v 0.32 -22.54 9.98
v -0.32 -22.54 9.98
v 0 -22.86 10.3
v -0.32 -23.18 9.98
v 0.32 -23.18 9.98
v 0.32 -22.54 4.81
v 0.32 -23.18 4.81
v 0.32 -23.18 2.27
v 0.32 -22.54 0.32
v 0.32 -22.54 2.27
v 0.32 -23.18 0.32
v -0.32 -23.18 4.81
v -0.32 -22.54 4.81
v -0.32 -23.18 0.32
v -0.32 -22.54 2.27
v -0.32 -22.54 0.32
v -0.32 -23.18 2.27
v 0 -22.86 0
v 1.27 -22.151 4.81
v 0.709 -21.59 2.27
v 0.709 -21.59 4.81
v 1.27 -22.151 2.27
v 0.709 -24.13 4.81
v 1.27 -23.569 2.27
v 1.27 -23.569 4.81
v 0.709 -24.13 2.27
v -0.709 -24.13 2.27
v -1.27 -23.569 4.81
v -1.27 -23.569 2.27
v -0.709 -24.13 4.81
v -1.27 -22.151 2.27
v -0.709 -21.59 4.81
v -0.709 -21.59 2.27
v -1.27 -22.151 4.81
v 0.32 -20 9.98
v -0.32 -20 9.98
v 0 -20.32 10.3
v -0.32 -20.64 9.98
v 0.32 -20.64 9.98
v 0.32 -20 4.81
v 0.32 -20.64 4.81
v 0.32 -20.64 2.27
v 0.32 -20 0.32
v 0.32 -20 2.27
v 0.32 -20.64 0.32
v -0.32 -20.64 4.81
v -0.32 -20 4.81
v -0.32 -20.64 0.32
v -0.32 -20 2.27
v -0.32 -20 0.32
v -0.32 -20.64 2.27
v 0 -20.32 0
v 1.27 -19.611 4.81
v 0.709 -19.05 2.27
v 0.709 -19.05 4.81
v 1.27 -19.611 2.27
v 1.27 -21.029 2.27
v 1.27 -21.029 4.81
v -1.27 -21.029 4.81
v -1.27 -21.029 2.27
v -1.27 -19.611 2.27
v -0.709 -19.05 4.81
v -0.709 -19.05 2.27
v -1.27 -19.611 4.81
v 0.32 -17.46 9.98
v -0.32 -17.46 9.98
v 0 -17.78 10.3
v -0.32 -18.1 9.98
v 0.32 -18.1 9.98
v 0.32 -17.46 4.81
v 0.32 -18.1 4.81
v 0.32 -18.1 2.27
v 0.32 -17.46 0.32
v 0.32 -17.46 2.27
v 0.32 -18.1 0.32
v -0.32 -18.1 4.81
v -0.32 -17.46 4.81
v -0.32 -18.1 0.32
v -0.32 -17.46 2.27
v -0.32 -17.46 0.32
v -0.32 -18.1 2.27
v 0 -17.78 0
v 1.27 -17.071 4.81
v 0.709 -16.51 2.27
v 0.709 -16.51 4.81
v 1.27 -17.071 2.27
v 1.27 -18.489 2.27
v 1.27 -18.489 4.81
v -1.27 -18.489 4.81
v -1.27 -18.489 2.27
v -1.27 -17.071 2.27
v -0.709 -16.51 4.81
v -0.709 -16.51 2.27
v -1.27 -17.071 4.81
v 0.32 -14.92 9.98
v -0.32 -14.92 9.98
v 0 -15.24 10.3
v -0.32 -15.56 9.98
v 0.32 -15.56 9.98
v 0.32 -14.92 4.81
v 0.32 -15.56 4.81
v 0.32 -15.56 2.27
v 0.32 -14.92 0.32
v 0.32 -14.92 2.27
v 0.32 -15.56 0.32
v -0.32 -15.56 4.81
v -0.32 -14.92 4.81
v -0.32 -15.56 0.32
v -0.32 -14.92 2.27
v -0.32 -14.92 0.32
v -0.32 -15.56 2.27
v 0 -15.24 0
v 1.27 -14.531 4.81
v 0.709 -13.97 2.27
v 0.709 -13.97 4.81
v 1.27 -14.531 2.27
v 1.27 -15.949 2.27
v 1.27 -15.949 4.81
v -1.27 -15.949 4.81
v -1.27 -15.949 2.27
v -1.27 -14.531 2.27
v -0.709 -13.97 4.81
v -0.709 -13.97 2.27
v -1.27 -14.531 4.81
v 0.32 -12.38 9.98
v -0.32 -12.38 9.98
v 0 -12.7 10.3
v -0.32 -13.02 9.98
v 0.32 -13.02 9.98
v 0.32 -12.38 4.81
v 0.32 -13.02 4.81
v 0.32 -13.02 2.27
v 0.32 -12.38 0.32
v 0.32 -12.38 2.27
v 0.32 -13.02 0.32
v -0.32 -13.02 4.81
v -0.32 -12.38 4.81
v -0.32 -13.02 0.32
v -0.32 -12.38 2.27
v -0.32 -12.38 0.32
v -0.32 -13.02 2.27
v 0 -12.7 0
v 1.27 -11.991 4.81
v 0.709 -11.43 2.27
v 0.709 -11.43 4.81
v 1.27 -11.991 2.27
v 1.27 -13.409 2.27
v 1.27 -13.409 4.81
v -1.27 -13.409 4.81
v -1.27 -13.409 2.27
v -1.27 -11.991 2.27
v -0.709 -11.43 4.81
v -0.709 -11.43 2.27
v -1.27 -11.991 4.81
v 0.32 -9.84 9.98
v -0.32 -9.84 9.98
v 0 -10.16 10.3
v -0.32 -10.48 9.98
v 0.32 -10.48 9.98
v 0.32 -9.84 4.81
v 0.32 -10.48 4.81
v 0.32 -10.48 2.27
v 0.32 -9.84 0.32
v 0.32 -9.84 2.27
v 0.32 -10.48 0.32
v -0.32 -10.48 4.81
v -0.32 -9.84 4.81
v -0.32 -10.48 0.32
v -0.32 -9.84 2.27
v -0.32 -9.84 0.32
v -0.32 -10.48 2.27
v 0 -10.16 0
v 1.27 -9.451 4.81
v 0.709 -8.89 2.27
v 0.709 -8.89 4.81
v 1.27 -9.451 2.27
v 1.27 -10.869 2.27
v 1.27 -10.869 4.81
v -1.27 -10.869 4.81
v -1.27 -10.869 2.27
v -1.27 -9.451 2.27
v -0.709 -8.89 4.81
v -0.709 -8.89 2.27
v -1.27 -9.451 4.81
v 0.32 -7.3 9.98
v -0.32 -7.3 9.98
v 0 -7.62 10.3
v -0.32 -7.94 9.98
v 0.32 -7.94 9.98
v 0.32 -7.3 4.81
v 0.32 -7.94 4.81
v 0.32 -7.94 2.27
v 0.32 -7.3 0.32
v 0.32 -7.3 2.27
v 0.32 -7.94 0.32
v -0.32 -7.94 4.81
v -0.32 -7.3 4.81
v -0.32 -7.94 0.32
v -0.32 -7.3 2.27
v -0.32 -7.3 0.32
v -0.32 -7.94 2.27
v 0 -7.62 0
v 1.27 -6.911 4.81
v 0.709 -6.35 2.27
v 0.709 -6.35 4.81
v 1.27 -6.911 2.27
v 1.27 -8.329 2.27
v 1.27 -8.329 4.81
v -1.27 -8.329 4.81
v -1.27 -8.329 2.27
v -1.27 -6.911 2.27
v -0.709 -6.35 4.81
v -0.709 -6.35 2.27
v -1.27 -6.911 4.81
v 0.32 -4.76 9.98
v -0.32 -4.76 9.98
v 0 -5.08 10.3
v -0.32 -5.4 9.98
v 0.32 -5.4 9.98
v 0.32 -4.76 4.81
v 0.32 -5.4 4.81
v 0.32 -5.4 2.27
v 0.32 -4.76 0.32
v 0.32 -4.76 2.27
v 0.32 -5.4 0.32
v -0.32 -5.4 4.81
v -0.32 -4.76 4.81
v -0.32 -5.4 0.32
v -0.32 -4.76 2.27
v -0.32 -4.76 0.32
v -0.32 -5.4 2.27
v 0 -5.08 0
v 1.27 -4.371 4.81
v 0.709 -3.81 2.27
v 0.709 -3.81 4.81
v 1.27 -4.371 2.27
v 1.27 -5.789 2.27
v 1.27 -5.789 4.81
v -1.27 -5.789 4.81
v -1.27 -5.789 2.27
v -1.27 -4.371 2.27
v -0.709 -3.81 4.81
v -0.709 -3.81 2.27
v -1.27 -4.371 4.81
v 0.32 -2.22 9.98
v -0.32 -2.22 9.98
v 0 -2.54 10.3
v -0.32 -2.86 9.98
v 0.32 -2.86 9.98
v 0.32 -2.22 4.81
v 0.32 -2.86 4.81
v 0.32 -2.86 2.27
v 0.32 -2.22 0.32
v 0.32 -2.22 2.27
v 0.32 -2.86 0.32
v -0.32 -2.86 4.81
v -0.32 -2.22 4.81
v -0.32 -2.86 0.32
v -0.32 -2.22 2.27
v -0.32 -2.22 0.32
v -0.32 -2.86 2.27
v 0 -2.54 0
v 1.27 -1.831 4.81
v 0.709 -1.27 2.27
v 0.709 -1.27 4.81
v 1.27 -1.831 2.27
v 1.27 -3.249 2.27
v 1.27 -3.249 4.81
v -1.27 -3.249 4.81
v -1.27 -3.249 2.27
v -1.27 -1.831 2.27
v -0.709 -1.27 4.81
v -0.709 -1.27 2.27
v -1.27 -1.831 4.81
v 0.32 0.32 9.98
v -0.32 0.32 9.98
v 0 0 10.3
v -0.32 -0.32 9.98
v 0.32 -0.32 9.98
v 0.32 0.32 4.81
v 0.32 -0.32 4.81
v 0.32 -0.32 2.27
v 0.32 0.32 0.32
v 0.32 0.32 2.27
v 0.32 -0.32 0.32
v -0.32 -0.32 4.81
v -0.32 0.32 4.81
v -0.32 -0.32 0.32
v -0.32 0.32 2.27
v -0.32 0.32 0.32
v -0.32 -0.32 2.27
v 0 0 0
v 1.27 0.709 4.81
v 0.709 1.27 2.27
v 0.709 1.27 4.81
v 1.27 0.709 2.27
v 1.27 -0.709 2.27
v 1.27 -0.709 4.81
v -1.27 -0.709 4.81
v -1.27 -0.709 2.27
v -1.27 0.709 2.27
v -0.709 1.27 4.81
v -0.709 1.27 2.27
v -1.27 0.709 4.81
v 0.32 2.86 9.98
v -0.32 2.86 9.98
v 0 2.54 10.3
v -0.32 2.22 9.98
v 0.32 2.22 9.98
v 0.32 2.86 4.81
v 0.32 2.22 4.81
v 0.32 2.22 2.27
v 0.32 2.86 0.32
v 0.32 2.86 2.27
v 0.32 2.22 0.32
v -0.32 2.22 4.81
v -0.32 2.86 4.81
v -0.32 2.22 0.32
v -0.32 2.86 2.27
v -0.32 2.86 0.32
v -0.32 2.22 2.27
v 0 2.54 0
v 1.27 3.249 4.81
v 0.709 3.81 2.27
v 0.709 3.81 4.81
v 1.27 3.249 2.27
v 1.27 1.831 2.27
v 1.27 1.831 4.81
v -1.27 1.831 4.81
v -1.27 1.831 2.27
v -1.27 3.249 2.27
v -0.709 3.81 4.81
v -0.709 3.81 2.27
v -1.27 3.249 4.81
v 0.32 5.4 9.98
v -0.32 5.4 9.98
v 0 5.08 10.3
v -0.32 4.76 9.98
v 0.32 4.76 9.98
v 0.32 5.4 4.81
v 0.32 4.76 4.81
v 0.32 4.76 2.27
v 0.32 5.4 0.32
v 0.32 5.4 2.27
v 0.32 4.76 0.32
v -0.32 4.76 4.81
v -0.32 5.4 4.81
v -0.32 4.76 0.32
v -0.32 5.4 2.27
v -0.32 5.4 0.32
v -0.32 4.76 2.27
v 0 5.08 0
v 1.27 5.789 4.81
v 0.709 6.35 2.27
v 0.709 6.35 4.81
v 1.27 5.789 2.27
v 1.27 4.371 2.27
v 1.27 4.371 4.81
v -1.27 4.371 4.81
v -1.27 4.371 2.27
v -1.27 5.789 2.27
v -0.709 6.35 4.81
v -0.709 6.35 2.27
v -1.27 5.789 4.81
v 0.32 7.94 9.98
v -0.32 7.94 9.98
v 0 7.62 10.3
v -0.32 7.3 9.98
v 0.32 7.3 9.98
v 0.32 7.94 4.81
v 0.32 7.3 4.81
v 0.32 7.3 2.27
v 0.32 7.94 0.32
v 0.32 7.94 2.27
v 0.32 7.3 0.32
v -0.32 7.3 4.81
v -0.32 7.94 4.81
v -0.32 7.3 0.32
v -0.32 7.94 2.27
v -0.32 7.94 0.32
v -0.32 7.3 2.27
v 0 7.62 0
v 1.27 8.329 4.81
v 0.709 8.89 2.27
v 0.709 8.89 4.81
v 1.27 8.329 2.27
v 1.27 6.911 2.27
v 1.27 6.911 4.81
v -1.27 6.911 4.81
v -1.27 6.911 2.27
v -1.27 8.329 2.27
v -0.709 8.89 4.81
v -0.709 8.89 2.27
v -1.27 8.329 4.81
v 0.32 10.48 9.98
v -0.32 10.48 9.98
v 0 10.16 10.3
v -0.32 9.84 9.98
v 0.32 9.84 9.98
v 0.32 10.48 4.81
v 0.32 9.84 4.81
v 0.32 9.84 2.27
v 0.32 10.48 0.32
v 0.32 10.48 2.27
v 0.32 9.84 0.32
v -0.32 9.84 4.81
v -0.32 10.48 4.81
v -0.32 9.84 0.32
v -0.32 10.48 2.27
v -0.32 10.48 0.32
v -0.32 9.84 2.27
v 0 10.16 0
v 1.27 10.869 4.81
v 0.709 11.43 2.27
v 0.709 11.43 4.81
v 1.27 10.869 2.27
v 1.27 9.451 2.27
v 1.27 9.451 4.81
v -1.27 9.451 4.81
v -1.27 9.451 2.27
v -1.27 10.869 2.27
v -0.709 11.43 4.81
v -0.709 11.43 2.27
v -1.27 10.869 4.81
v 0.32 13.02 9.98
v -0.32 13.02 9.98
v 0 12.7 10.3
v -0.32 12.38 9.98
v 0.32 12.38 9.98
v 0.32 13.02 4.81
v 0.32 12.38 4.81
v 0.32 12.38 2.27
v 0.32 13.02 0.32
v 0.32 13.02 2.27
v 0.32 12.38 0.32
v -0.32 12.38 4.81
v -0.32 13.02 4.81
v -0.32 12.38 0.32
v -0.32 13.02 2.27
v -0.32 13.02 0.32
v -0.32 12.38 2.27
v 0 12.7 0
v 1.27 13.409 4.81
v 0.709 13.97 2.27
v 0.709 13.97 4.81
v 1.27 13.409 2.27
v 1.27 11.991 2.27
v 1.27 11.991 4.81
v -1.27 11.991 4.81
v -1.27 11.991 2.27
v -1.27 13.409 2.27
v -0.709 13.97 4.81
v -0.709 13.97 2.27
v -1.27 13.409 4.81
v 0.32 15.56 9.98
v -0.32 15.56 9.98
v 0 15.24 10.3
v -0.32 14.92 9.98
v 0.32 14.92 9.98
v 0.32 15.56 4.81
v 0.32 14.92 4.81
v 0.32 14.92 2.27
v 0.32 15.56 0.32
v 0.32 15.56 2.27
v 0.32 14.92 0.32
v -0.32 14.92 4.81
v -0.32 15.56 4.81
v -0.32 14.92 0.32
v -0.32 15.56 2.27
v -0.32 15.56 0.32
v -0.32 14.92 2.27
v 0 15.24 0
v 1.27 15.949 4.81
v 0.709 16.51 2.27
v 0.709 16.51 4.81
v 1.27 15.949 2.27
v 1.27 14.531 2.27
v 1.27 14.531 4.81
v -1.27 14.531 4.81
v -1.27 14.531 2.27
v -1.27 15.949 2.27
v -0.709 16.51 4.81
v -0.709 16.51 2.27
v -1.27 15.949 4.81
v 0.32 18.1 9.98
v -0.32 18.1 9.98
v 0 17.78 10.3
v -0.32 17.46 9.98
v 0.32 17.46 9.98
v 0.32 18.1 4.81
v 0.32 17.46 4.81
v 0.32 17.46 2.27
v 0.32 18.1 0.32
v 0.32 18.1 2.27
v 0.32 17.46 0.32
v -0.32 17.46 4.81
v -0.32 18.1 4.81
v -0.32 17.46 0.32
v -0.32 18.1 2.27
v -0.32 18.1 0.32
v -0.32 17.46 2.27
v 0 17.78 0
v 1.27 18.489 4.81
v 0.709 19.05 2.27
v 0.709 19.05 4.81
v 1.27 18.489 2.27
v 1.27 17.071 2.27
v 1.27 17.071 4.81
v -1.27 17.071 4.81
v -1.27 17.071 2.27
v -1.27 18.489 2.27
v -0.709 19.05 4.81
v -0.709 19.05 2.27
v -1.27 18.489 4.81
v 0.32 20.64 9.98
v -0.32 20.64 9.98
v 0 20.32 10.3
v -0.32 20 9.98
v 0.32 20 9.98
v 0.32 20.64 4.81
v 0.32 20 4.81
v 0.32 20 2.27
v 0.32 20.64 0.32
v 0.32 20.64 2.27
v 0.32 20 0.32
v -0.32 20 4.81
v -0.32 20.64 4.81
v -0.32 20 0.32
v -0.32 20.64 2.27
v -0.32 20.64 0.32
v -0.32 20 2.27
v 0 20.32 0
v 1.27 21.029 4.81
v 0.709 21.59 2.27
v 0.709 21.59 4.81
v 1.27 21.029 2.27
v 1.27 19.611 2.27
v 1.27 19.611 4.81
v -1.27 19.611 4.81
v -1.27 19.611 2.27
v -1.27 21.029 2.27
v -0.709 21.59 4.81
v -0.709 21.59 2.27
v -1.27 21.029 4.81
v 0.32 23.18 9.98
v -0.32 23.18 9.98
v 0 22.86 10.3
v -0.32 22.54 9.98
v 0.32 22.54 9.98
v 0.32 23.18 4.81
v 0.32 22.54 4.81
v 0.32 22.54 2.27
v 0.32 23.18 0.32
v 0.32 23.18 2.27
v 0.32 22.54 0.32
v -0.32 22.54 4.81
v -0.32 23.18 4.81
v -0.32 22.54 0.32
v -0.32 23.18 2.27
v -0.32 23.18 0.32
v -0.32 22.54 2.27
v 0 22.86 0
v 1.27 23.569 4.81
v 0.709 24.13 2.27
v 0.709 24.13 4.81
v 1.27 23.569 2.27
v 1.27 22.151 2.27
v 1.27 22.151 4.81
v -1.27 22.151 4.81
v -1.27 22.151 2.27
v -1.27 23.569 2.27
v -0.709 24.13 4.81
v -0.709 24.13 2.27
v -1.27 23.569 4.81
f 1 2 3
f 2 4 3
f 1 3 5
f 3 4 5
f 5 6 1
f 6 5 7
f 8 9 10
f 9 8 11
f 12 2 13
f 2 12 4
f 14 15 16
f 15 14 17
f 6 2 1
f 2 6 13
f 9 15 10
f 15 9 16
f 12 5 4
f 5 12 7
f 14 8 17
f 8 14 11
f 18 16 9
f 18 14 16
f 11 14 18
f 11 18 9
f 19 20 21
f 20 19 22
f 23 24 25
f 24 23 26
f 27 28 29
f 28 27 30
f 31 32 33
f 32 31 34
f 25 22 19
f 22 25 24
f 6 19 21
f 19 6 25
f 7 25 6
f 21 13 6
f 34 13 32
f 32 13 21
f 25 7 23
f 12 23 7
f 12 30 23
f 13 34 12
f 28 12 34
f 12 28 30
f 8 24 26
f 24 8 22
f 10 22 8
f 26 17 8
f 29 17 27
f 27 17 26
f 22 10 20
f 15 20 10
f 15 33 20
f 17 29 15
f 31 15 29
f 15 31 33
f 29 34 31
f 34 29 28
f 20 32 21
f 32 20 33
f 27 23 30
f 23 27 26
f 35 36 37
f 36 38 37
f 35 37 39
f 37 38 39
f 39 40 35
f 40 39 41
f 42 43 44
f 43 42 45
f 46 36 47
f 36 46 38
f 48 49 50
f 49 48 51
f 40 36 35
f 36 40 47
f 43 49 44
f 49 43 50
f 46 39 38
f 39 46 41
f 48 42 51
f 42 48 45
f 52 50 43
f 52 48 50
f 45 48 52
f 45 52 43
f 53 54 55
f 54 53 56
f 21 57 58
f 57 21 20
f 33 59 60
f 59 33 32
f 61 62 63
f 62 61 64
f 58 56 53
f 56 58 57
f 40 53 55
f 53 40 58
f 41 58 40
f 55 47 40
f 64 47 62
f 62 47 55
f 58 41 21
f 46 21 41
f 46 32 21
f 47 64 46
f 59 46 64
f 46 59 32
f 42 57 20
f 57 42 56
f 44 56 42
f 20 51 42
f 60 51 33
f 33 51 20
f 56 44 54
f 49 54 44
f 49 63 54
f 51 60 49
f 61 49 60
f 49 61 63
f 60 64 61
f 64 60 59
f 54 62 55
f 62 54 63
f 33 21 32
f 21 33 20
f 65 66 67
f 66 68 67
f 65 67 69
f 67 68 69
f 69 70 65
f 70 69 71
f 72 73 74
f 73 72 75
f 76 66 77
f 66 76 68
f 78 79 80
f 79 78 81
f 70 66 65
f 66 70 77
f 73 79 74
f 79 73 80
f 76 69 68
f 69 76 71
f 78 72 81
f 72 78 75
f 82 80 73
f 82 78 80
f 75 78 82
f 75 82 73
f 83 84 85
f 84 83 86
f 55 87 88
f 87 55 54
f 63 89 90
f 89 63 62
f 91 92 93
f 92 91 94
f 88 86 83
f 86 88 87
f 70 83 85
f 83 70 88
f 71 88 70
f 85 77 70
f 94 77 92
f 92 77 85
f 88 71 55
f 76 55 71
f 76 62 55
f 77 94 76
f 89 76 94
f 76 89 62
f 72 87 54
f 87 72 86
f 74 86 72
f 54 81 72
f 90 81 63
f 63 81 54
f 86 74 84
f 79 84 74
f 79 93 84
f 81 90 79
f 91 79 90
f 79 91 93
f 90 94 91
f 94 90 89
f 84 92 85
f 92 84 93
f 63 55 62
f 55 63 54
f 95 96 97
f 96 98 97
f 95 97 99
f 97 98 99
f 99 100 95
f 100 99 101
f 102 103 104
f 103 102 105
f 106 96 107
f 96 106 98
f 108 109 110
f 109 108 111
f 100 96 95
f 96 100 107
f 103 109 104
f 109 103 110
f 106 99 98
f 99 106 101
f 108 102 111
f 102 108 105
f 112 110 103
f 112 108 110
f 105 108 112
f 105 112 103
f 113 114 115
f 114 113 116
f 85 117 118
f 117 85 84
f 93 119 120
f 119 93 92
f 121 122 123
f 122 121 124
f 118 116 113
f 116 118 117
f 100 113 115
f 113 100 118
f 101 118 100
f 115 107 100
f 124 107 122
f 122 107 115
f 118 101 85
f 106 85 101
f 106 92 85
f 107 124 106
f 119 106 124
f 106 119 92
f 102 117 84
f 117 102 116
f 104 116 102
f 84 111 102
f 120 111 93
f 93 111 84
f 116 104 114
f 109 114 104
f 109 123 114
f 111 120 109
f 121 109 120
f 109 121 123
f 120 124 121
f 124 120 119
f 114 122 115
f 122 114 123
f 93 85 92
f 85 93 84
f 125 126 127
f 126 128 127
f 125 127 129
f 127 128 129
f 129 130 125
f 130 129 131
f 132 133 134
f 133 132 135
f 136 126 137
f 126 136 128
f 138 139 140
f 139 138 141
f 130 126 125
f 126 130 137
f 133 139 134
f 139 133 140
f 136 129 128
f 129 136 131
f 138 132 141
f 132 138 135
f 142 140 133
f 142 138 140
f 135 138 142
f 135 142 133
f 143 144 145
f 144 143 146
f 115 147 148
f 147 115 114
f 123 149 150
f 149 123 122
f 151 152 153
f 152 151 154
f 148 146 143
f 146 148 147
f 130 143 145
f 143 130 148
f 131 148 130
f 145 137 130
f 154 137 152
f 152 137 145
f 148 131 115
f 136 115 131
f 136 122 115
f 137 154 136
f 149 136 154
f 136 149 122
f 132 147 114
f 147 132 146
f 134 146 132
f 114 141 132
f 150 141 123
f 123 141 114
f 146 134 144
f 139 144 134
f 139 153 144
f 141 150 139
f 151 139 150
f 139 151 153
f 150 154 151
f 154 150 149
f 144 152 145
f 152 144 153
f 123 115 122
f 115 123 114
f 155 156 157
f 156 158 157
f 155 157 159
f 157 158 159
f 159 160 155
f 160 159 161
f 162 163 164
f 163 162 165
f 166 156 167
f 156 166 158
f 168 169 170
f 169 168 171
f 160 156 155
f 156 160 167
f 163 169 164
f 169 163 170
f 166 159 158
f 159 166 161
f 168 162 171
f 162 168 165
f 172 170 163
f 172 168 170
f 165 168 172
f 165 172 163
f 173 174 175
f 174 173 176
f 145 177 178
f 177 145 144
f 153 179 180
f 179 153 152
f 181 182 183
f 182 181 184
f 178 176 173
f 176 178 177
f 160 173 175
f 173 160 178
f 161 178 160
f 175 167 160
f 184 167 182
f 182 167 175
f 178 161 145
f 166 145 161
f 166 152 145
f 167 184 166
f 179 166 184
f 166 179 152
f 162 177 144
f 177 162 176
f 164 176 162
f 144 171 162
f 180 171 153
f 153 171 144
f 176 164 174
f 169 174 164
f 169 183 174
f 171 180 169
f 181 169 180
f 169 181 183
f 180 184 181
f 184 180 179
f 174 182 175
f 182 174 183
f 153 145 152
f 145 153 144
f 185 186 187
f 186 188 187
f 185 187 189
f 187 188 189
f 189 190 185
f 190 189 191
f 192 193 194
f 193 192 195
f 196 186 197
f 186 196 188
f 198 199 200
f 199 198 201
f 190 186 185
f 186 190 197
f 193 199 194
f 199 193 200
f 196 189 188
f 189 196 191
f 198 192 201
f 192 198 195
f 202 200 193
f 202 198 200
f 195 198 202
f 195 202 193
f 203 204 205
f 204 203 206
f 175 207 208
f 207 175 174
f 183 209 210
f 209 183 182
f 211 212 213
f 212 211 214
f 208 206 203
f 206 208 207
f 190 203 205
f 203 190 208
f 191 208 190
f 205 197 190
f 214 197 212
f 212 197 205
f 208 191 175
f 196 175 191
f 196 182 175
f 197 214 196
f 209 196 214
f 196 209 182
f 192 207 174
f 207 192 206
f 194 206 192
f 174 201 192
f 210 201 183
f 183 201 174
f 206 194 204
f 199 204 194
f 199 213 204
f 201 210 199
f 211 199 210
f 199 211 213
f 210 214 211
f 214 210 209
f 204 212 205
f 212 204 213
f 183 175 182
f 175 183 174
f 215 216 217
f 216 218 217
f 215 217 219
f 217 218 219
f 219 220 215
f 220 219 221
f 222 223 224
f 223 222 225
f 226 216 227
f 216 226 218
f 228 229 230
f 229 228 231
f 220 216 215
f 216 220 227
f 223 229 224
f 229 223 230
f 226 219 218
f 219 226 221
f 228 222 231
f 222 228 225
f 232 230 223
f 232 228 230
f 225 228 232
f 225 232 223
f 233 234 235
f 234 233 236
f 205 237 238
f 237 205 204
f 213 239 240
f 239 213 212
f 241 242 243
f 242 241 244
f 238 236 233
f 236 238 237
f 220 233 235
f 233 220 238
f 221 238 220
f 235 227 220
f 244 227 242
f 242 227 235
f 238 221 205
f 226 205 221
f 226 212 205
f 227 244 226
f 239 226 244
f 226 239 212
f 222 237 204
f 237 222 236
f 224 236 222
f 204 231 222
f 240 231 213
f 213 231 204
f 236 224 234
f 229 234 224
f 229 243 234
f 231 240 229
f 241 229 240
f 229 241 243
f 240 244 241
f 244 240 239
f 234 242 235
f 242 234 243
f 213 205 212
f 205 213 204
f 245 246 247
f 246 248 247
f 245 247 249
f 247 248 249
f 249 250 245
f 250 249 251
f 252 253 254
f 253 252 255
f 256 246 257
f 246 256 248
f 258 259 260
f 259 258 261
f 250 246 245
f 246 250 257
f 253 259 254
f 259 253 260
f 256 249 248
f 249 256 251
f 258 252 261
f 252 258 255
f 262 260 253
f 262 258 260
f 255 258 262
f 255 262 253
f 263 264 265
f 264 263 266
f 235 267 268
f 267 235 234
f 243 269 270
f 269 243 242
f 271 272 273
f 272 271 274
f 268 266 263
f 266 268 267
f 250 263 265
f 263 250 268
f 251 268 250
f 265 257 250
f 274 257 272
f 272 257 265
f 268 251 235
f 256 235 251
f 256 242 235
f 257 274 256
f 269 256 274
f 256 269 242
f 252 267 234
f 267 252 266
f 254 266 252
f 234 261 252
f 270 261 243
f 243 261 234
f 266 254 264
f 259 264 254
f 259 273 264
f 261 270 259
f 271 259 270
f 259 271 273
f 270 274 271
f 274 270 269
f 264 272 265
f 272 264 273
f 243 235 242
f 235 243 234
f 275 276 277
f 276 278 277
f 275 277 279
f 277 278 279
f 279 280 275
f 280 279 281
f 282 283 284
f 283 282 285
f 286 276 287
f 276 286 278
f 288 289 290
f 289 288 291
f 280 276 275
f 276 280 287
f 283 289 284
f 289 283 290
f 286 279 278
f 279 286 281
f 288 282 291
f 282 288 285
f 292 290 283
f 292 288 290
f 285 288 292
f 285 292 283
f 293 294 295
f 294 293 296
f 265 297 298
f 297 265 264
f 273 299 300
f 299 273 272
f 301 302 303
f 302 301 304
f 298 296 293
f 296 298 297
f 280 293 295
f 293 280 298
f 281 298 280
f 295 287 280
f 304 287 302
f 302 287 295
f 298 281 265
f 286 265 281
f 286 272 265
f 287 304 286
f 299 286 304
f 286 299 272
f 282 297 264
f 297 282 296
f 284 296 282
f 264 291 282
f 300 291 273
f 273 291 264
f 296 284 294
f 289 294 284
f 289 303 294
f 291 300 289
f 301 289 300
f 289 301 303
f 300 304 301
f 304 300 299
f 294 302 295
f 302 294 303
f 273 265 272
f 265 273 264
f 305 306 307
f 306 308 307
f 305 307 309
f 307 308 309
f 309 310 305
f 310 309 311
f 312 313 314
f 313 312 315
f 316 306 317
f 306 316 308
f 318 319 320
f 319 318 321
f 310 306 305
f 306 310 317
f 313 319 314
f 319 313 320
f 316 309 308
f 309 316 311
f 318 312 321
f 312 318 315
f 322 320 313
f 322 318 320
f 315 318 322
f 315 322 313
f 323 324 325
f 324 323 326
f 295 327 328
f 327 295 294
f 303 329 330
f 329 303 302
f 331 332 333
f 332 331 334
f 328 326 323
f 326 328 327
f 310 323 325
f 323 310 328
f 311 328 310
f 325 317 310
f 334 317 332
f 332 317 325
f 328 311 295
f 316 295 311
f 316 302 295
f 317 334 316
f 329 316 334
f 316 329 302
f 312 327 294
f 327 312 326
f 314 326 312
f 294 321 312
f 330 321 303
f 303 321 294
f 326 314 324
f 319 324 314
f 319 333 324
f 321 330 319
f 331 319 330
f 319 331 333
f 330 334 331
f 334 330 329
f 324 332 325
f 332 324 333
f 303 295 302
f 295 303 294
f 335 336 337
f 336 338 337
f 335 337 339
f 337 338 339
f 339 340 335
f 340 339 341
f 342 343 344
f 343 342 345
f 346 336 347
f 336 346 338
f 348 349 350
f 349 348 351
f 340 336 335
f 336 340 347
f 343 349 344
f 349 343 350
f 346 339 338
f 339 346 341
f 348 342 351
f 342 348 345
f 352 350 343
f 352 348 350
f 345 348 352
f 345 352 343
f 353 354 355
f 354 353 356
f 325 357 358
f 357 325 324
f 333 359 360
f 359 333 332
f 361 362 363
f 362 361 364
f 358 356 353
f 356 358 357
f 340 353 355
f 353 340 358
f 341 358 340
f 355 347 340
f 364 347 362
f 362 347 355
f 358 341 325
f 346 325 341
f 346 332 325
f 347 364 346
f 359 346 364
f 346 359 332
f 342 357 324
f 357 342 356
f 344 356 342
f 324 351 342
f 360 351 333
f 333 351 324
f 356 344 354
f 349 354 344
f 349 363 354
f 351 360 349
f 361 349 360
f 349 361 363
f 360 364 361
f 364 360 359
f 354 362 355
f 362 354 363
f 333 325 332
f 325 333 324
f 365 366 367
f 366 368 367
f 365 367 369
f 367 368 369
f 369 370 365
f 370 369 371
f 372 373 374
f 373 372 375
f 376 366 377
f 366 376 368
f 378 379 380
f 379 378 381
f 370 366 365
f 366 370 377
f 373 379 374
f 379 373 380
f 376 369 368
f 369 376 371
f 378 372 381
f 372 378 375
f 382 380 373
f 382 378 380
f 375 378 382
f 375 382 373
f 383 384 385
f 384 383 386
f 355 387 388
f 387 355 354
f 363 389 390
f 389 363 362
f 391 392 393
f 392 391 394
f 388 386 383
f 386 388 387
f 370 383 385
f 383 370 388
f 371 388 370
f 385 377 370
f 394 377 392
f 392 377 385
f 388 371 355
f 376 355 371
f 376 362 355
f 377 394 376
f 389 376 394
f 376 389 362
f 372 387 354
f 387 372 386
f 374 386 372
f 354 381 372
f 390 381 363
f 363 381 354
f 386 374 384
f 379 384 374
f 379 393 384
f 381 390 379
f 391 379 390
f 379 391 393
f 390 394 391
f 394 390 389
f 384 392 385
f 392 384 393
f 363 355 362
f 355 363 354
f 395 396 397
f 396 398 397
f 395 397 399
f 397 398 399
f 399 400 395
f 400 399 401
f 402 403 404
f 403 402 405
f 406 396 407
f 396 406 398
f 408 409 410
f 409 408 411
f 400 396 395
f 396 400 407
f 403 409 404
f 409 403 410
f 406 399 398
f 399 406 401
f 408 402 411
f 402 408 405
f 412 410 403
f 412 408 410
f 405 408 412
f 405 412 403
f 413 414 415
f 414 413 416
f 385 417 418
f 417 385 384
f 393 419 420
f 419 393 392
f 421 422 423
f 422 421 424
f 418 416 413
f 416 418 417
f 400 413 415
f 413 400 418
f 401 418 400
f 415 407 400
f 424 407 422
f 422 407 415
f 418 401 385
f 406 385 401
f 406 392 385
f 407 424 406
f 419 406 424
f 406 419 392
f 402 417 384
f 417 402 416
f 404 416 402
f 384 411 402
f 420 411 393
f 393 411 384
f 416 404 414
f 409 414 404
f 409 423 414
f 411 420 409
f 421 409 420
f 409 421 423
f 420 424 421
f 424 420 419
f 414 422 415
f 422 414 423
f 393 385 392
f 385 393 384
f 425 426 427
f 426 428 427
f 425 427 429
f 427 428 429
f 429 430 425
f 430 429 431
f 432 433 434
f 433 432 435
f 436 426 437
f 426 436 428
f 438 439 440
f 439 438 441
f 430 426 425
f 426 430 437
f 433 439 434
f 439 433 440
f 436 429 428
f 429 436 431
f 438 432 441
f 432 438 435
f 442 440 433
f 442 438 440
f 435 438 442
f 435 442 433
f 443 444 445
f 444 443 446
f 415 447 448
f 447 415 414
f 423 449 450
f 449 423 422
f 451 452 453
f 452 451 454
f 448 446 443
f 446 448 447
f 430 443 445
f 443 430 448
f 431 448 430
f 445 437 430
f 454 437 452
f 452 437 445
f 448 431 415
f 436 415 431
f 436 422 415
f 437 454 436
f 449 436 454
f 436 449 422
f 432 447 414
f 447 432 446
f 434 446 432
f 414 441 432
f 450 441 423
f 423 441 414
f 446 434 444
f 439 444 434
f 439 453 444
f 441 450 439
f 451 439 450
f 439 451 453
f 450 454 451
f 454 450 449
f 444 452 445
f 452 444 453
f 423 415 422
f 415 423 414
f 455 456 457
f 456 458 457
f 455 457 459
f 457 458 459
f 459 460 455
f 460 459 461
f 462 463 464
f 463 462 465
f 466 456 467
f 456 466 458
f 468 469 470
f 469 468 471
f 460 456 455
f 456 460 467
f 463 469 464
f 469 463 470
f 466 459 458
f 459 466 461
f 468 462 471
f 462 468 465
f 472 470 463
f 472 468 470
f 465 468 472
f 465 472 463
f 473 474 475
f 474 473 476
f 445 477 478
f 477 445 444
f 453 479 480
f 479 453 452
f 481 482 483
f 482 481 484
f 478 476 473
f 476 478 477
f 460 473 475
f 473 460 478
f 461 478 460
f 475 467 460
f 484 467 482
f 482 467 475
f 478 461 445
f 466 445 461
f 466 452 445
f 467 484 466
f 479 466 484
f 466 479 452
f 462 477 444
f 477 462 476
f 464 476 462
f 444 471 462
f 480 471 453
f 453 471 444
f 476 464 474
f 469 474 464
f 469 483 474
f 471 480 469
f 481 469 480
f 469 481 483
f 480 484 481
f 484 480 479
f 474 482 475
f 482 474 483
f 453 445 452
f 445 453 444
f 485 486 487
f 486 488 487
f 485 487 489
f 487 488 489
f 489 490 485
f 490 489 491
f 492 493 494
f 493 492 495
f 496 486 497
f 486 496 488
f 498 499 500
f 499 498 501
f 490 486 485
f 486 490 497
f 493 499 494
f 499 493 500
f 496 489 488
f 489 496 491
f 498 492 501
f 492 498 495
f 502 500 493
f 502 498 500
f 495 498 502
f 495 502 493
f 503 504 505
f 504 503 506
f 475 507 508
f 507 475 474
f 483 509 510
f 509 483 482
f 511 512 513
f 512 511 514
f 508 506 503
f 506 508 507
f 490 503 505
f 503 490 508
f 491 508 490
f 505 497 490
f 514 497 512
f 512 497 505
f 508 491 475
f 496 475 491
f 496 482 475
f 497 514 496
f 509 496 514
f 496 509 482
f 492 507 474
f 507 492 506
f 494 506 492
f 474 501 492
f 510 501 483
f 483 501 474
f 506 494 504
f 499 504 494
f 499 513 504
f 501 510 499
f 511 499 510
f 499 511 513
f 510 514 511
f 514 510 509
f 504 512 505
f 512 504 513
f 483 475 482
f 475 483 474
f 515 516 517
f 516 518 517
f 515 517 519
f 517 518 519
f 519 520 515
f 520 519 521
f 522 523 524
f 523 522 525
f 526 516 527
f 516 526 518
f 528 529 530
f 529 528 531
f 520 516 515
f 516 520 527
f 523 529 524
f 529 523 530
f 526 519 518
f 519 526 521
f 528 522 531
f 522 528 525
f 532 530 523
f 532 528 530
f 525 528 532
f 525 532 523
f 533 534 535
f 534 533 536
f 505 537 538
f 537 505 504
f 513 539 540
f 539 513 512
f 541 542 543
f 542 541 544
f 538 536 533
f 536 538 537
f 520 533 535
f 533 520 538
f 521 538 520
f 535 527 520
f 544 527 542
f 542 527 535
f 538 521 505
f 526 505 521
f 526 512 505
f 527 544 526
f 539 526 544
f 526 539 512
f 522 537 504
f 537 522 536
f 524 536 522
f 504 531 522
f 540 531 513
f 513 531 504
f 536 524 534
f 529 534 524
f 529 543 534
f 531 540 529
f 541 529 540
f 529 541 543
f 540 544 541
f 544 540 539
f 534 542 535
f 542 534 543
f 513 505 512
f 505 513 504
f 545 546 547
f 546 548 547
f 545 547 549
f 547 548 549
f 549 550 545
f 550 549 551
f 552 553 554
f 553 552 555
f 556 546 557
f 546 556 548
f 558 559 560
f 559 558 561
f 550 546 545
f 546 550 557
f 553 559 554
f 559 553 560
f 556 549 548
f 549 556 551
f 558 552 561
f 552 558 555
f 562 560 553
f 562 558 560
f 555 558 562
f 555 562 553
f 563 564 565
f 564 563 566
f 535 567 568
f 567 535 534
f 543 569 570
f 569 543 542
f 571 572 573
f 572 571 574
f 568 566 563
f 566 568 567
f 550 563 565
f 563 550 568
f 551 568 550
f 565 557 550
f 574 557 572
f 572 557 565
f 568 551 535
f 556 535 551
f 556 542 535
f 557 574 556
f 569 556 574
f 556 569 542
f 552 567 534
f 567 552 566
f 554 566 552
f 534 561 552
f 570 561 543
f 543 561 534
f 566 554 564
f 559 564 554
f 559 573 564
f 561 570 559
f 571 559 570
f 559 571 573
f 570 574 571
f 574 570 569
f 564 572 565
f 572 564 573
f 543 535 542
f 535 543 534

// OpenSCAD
//Number of rows of pins in the header
header_rows = 19; //[1,2,3,4,5,6,7,8,9,10]

//Number of columns of pins in the header
header_columns = 1; //[1,2,3]

//The header's pitch between any two pins
header_pitch = 2.54; //[1.27,2.54]

header(header_rows,header_columns,header_pitch);

module header(rows,cols,pitch){
    offsety=-1*((rows-1)/2*pitch);
    offsetx=-1*((cols-1)/2*pitch);
    translate([offsetx,offsety,0])
    union(){
        for(j=[0:1:cols-1]){
            translate([pitch*j,0,0])
            for(i=[0:1:rows-1]){
                translate([0,pitch*i,0])pin(pitch);
            }
        }
    }
}

module pin(p=2.54){
    s=p/4+0.005;
    h=p*4-0.5;
    base=h/3;
    d=s/2;
    union(){
        color("gold")union(){
            translate([0,0,h+d])rotate([0,0,45])
            cylinder($fn=4,r1=sqrt(2*pow(d,2)),r2=0,h=d,center=false);
            translate([-d,-d,d])cube([s,s,h],center=false);
            translate([0,0,d])rotate([0,0,45])mirror([0,0,d])
            cylinder($fn=4,r1=sqrt(2*pow(d,2)),r2=0,h=d,center=false);
        }
       color("Dimgray")difference(){
            translate([0,0,base+d])cube([p,p,p],center=true);
            union(){
                translate([1.9*s,1.9*s,base+d])rotate([0,0,45])cylinder($fn=3,r=2*d,h=p+1,center=true);
                translate([1.9*s,-1.9*s,base+d-0.15])rotate([0,0,-45])cylinder($fn=3,r=2*d,h=p+1,center=true);
                translate([-1.9*s,-1.9*s,base+d-0.3])rotate([0,0,180+45])cylinder($fn=3,r=2*d,h=p+1,center=true);
                translate([-1.9*s,1.9*s,base+d-0.3])rotate([0,0,180-45])cylinder($fn=3,r=2*d,h=p+1,center=true);
            }
        }
    }
}
